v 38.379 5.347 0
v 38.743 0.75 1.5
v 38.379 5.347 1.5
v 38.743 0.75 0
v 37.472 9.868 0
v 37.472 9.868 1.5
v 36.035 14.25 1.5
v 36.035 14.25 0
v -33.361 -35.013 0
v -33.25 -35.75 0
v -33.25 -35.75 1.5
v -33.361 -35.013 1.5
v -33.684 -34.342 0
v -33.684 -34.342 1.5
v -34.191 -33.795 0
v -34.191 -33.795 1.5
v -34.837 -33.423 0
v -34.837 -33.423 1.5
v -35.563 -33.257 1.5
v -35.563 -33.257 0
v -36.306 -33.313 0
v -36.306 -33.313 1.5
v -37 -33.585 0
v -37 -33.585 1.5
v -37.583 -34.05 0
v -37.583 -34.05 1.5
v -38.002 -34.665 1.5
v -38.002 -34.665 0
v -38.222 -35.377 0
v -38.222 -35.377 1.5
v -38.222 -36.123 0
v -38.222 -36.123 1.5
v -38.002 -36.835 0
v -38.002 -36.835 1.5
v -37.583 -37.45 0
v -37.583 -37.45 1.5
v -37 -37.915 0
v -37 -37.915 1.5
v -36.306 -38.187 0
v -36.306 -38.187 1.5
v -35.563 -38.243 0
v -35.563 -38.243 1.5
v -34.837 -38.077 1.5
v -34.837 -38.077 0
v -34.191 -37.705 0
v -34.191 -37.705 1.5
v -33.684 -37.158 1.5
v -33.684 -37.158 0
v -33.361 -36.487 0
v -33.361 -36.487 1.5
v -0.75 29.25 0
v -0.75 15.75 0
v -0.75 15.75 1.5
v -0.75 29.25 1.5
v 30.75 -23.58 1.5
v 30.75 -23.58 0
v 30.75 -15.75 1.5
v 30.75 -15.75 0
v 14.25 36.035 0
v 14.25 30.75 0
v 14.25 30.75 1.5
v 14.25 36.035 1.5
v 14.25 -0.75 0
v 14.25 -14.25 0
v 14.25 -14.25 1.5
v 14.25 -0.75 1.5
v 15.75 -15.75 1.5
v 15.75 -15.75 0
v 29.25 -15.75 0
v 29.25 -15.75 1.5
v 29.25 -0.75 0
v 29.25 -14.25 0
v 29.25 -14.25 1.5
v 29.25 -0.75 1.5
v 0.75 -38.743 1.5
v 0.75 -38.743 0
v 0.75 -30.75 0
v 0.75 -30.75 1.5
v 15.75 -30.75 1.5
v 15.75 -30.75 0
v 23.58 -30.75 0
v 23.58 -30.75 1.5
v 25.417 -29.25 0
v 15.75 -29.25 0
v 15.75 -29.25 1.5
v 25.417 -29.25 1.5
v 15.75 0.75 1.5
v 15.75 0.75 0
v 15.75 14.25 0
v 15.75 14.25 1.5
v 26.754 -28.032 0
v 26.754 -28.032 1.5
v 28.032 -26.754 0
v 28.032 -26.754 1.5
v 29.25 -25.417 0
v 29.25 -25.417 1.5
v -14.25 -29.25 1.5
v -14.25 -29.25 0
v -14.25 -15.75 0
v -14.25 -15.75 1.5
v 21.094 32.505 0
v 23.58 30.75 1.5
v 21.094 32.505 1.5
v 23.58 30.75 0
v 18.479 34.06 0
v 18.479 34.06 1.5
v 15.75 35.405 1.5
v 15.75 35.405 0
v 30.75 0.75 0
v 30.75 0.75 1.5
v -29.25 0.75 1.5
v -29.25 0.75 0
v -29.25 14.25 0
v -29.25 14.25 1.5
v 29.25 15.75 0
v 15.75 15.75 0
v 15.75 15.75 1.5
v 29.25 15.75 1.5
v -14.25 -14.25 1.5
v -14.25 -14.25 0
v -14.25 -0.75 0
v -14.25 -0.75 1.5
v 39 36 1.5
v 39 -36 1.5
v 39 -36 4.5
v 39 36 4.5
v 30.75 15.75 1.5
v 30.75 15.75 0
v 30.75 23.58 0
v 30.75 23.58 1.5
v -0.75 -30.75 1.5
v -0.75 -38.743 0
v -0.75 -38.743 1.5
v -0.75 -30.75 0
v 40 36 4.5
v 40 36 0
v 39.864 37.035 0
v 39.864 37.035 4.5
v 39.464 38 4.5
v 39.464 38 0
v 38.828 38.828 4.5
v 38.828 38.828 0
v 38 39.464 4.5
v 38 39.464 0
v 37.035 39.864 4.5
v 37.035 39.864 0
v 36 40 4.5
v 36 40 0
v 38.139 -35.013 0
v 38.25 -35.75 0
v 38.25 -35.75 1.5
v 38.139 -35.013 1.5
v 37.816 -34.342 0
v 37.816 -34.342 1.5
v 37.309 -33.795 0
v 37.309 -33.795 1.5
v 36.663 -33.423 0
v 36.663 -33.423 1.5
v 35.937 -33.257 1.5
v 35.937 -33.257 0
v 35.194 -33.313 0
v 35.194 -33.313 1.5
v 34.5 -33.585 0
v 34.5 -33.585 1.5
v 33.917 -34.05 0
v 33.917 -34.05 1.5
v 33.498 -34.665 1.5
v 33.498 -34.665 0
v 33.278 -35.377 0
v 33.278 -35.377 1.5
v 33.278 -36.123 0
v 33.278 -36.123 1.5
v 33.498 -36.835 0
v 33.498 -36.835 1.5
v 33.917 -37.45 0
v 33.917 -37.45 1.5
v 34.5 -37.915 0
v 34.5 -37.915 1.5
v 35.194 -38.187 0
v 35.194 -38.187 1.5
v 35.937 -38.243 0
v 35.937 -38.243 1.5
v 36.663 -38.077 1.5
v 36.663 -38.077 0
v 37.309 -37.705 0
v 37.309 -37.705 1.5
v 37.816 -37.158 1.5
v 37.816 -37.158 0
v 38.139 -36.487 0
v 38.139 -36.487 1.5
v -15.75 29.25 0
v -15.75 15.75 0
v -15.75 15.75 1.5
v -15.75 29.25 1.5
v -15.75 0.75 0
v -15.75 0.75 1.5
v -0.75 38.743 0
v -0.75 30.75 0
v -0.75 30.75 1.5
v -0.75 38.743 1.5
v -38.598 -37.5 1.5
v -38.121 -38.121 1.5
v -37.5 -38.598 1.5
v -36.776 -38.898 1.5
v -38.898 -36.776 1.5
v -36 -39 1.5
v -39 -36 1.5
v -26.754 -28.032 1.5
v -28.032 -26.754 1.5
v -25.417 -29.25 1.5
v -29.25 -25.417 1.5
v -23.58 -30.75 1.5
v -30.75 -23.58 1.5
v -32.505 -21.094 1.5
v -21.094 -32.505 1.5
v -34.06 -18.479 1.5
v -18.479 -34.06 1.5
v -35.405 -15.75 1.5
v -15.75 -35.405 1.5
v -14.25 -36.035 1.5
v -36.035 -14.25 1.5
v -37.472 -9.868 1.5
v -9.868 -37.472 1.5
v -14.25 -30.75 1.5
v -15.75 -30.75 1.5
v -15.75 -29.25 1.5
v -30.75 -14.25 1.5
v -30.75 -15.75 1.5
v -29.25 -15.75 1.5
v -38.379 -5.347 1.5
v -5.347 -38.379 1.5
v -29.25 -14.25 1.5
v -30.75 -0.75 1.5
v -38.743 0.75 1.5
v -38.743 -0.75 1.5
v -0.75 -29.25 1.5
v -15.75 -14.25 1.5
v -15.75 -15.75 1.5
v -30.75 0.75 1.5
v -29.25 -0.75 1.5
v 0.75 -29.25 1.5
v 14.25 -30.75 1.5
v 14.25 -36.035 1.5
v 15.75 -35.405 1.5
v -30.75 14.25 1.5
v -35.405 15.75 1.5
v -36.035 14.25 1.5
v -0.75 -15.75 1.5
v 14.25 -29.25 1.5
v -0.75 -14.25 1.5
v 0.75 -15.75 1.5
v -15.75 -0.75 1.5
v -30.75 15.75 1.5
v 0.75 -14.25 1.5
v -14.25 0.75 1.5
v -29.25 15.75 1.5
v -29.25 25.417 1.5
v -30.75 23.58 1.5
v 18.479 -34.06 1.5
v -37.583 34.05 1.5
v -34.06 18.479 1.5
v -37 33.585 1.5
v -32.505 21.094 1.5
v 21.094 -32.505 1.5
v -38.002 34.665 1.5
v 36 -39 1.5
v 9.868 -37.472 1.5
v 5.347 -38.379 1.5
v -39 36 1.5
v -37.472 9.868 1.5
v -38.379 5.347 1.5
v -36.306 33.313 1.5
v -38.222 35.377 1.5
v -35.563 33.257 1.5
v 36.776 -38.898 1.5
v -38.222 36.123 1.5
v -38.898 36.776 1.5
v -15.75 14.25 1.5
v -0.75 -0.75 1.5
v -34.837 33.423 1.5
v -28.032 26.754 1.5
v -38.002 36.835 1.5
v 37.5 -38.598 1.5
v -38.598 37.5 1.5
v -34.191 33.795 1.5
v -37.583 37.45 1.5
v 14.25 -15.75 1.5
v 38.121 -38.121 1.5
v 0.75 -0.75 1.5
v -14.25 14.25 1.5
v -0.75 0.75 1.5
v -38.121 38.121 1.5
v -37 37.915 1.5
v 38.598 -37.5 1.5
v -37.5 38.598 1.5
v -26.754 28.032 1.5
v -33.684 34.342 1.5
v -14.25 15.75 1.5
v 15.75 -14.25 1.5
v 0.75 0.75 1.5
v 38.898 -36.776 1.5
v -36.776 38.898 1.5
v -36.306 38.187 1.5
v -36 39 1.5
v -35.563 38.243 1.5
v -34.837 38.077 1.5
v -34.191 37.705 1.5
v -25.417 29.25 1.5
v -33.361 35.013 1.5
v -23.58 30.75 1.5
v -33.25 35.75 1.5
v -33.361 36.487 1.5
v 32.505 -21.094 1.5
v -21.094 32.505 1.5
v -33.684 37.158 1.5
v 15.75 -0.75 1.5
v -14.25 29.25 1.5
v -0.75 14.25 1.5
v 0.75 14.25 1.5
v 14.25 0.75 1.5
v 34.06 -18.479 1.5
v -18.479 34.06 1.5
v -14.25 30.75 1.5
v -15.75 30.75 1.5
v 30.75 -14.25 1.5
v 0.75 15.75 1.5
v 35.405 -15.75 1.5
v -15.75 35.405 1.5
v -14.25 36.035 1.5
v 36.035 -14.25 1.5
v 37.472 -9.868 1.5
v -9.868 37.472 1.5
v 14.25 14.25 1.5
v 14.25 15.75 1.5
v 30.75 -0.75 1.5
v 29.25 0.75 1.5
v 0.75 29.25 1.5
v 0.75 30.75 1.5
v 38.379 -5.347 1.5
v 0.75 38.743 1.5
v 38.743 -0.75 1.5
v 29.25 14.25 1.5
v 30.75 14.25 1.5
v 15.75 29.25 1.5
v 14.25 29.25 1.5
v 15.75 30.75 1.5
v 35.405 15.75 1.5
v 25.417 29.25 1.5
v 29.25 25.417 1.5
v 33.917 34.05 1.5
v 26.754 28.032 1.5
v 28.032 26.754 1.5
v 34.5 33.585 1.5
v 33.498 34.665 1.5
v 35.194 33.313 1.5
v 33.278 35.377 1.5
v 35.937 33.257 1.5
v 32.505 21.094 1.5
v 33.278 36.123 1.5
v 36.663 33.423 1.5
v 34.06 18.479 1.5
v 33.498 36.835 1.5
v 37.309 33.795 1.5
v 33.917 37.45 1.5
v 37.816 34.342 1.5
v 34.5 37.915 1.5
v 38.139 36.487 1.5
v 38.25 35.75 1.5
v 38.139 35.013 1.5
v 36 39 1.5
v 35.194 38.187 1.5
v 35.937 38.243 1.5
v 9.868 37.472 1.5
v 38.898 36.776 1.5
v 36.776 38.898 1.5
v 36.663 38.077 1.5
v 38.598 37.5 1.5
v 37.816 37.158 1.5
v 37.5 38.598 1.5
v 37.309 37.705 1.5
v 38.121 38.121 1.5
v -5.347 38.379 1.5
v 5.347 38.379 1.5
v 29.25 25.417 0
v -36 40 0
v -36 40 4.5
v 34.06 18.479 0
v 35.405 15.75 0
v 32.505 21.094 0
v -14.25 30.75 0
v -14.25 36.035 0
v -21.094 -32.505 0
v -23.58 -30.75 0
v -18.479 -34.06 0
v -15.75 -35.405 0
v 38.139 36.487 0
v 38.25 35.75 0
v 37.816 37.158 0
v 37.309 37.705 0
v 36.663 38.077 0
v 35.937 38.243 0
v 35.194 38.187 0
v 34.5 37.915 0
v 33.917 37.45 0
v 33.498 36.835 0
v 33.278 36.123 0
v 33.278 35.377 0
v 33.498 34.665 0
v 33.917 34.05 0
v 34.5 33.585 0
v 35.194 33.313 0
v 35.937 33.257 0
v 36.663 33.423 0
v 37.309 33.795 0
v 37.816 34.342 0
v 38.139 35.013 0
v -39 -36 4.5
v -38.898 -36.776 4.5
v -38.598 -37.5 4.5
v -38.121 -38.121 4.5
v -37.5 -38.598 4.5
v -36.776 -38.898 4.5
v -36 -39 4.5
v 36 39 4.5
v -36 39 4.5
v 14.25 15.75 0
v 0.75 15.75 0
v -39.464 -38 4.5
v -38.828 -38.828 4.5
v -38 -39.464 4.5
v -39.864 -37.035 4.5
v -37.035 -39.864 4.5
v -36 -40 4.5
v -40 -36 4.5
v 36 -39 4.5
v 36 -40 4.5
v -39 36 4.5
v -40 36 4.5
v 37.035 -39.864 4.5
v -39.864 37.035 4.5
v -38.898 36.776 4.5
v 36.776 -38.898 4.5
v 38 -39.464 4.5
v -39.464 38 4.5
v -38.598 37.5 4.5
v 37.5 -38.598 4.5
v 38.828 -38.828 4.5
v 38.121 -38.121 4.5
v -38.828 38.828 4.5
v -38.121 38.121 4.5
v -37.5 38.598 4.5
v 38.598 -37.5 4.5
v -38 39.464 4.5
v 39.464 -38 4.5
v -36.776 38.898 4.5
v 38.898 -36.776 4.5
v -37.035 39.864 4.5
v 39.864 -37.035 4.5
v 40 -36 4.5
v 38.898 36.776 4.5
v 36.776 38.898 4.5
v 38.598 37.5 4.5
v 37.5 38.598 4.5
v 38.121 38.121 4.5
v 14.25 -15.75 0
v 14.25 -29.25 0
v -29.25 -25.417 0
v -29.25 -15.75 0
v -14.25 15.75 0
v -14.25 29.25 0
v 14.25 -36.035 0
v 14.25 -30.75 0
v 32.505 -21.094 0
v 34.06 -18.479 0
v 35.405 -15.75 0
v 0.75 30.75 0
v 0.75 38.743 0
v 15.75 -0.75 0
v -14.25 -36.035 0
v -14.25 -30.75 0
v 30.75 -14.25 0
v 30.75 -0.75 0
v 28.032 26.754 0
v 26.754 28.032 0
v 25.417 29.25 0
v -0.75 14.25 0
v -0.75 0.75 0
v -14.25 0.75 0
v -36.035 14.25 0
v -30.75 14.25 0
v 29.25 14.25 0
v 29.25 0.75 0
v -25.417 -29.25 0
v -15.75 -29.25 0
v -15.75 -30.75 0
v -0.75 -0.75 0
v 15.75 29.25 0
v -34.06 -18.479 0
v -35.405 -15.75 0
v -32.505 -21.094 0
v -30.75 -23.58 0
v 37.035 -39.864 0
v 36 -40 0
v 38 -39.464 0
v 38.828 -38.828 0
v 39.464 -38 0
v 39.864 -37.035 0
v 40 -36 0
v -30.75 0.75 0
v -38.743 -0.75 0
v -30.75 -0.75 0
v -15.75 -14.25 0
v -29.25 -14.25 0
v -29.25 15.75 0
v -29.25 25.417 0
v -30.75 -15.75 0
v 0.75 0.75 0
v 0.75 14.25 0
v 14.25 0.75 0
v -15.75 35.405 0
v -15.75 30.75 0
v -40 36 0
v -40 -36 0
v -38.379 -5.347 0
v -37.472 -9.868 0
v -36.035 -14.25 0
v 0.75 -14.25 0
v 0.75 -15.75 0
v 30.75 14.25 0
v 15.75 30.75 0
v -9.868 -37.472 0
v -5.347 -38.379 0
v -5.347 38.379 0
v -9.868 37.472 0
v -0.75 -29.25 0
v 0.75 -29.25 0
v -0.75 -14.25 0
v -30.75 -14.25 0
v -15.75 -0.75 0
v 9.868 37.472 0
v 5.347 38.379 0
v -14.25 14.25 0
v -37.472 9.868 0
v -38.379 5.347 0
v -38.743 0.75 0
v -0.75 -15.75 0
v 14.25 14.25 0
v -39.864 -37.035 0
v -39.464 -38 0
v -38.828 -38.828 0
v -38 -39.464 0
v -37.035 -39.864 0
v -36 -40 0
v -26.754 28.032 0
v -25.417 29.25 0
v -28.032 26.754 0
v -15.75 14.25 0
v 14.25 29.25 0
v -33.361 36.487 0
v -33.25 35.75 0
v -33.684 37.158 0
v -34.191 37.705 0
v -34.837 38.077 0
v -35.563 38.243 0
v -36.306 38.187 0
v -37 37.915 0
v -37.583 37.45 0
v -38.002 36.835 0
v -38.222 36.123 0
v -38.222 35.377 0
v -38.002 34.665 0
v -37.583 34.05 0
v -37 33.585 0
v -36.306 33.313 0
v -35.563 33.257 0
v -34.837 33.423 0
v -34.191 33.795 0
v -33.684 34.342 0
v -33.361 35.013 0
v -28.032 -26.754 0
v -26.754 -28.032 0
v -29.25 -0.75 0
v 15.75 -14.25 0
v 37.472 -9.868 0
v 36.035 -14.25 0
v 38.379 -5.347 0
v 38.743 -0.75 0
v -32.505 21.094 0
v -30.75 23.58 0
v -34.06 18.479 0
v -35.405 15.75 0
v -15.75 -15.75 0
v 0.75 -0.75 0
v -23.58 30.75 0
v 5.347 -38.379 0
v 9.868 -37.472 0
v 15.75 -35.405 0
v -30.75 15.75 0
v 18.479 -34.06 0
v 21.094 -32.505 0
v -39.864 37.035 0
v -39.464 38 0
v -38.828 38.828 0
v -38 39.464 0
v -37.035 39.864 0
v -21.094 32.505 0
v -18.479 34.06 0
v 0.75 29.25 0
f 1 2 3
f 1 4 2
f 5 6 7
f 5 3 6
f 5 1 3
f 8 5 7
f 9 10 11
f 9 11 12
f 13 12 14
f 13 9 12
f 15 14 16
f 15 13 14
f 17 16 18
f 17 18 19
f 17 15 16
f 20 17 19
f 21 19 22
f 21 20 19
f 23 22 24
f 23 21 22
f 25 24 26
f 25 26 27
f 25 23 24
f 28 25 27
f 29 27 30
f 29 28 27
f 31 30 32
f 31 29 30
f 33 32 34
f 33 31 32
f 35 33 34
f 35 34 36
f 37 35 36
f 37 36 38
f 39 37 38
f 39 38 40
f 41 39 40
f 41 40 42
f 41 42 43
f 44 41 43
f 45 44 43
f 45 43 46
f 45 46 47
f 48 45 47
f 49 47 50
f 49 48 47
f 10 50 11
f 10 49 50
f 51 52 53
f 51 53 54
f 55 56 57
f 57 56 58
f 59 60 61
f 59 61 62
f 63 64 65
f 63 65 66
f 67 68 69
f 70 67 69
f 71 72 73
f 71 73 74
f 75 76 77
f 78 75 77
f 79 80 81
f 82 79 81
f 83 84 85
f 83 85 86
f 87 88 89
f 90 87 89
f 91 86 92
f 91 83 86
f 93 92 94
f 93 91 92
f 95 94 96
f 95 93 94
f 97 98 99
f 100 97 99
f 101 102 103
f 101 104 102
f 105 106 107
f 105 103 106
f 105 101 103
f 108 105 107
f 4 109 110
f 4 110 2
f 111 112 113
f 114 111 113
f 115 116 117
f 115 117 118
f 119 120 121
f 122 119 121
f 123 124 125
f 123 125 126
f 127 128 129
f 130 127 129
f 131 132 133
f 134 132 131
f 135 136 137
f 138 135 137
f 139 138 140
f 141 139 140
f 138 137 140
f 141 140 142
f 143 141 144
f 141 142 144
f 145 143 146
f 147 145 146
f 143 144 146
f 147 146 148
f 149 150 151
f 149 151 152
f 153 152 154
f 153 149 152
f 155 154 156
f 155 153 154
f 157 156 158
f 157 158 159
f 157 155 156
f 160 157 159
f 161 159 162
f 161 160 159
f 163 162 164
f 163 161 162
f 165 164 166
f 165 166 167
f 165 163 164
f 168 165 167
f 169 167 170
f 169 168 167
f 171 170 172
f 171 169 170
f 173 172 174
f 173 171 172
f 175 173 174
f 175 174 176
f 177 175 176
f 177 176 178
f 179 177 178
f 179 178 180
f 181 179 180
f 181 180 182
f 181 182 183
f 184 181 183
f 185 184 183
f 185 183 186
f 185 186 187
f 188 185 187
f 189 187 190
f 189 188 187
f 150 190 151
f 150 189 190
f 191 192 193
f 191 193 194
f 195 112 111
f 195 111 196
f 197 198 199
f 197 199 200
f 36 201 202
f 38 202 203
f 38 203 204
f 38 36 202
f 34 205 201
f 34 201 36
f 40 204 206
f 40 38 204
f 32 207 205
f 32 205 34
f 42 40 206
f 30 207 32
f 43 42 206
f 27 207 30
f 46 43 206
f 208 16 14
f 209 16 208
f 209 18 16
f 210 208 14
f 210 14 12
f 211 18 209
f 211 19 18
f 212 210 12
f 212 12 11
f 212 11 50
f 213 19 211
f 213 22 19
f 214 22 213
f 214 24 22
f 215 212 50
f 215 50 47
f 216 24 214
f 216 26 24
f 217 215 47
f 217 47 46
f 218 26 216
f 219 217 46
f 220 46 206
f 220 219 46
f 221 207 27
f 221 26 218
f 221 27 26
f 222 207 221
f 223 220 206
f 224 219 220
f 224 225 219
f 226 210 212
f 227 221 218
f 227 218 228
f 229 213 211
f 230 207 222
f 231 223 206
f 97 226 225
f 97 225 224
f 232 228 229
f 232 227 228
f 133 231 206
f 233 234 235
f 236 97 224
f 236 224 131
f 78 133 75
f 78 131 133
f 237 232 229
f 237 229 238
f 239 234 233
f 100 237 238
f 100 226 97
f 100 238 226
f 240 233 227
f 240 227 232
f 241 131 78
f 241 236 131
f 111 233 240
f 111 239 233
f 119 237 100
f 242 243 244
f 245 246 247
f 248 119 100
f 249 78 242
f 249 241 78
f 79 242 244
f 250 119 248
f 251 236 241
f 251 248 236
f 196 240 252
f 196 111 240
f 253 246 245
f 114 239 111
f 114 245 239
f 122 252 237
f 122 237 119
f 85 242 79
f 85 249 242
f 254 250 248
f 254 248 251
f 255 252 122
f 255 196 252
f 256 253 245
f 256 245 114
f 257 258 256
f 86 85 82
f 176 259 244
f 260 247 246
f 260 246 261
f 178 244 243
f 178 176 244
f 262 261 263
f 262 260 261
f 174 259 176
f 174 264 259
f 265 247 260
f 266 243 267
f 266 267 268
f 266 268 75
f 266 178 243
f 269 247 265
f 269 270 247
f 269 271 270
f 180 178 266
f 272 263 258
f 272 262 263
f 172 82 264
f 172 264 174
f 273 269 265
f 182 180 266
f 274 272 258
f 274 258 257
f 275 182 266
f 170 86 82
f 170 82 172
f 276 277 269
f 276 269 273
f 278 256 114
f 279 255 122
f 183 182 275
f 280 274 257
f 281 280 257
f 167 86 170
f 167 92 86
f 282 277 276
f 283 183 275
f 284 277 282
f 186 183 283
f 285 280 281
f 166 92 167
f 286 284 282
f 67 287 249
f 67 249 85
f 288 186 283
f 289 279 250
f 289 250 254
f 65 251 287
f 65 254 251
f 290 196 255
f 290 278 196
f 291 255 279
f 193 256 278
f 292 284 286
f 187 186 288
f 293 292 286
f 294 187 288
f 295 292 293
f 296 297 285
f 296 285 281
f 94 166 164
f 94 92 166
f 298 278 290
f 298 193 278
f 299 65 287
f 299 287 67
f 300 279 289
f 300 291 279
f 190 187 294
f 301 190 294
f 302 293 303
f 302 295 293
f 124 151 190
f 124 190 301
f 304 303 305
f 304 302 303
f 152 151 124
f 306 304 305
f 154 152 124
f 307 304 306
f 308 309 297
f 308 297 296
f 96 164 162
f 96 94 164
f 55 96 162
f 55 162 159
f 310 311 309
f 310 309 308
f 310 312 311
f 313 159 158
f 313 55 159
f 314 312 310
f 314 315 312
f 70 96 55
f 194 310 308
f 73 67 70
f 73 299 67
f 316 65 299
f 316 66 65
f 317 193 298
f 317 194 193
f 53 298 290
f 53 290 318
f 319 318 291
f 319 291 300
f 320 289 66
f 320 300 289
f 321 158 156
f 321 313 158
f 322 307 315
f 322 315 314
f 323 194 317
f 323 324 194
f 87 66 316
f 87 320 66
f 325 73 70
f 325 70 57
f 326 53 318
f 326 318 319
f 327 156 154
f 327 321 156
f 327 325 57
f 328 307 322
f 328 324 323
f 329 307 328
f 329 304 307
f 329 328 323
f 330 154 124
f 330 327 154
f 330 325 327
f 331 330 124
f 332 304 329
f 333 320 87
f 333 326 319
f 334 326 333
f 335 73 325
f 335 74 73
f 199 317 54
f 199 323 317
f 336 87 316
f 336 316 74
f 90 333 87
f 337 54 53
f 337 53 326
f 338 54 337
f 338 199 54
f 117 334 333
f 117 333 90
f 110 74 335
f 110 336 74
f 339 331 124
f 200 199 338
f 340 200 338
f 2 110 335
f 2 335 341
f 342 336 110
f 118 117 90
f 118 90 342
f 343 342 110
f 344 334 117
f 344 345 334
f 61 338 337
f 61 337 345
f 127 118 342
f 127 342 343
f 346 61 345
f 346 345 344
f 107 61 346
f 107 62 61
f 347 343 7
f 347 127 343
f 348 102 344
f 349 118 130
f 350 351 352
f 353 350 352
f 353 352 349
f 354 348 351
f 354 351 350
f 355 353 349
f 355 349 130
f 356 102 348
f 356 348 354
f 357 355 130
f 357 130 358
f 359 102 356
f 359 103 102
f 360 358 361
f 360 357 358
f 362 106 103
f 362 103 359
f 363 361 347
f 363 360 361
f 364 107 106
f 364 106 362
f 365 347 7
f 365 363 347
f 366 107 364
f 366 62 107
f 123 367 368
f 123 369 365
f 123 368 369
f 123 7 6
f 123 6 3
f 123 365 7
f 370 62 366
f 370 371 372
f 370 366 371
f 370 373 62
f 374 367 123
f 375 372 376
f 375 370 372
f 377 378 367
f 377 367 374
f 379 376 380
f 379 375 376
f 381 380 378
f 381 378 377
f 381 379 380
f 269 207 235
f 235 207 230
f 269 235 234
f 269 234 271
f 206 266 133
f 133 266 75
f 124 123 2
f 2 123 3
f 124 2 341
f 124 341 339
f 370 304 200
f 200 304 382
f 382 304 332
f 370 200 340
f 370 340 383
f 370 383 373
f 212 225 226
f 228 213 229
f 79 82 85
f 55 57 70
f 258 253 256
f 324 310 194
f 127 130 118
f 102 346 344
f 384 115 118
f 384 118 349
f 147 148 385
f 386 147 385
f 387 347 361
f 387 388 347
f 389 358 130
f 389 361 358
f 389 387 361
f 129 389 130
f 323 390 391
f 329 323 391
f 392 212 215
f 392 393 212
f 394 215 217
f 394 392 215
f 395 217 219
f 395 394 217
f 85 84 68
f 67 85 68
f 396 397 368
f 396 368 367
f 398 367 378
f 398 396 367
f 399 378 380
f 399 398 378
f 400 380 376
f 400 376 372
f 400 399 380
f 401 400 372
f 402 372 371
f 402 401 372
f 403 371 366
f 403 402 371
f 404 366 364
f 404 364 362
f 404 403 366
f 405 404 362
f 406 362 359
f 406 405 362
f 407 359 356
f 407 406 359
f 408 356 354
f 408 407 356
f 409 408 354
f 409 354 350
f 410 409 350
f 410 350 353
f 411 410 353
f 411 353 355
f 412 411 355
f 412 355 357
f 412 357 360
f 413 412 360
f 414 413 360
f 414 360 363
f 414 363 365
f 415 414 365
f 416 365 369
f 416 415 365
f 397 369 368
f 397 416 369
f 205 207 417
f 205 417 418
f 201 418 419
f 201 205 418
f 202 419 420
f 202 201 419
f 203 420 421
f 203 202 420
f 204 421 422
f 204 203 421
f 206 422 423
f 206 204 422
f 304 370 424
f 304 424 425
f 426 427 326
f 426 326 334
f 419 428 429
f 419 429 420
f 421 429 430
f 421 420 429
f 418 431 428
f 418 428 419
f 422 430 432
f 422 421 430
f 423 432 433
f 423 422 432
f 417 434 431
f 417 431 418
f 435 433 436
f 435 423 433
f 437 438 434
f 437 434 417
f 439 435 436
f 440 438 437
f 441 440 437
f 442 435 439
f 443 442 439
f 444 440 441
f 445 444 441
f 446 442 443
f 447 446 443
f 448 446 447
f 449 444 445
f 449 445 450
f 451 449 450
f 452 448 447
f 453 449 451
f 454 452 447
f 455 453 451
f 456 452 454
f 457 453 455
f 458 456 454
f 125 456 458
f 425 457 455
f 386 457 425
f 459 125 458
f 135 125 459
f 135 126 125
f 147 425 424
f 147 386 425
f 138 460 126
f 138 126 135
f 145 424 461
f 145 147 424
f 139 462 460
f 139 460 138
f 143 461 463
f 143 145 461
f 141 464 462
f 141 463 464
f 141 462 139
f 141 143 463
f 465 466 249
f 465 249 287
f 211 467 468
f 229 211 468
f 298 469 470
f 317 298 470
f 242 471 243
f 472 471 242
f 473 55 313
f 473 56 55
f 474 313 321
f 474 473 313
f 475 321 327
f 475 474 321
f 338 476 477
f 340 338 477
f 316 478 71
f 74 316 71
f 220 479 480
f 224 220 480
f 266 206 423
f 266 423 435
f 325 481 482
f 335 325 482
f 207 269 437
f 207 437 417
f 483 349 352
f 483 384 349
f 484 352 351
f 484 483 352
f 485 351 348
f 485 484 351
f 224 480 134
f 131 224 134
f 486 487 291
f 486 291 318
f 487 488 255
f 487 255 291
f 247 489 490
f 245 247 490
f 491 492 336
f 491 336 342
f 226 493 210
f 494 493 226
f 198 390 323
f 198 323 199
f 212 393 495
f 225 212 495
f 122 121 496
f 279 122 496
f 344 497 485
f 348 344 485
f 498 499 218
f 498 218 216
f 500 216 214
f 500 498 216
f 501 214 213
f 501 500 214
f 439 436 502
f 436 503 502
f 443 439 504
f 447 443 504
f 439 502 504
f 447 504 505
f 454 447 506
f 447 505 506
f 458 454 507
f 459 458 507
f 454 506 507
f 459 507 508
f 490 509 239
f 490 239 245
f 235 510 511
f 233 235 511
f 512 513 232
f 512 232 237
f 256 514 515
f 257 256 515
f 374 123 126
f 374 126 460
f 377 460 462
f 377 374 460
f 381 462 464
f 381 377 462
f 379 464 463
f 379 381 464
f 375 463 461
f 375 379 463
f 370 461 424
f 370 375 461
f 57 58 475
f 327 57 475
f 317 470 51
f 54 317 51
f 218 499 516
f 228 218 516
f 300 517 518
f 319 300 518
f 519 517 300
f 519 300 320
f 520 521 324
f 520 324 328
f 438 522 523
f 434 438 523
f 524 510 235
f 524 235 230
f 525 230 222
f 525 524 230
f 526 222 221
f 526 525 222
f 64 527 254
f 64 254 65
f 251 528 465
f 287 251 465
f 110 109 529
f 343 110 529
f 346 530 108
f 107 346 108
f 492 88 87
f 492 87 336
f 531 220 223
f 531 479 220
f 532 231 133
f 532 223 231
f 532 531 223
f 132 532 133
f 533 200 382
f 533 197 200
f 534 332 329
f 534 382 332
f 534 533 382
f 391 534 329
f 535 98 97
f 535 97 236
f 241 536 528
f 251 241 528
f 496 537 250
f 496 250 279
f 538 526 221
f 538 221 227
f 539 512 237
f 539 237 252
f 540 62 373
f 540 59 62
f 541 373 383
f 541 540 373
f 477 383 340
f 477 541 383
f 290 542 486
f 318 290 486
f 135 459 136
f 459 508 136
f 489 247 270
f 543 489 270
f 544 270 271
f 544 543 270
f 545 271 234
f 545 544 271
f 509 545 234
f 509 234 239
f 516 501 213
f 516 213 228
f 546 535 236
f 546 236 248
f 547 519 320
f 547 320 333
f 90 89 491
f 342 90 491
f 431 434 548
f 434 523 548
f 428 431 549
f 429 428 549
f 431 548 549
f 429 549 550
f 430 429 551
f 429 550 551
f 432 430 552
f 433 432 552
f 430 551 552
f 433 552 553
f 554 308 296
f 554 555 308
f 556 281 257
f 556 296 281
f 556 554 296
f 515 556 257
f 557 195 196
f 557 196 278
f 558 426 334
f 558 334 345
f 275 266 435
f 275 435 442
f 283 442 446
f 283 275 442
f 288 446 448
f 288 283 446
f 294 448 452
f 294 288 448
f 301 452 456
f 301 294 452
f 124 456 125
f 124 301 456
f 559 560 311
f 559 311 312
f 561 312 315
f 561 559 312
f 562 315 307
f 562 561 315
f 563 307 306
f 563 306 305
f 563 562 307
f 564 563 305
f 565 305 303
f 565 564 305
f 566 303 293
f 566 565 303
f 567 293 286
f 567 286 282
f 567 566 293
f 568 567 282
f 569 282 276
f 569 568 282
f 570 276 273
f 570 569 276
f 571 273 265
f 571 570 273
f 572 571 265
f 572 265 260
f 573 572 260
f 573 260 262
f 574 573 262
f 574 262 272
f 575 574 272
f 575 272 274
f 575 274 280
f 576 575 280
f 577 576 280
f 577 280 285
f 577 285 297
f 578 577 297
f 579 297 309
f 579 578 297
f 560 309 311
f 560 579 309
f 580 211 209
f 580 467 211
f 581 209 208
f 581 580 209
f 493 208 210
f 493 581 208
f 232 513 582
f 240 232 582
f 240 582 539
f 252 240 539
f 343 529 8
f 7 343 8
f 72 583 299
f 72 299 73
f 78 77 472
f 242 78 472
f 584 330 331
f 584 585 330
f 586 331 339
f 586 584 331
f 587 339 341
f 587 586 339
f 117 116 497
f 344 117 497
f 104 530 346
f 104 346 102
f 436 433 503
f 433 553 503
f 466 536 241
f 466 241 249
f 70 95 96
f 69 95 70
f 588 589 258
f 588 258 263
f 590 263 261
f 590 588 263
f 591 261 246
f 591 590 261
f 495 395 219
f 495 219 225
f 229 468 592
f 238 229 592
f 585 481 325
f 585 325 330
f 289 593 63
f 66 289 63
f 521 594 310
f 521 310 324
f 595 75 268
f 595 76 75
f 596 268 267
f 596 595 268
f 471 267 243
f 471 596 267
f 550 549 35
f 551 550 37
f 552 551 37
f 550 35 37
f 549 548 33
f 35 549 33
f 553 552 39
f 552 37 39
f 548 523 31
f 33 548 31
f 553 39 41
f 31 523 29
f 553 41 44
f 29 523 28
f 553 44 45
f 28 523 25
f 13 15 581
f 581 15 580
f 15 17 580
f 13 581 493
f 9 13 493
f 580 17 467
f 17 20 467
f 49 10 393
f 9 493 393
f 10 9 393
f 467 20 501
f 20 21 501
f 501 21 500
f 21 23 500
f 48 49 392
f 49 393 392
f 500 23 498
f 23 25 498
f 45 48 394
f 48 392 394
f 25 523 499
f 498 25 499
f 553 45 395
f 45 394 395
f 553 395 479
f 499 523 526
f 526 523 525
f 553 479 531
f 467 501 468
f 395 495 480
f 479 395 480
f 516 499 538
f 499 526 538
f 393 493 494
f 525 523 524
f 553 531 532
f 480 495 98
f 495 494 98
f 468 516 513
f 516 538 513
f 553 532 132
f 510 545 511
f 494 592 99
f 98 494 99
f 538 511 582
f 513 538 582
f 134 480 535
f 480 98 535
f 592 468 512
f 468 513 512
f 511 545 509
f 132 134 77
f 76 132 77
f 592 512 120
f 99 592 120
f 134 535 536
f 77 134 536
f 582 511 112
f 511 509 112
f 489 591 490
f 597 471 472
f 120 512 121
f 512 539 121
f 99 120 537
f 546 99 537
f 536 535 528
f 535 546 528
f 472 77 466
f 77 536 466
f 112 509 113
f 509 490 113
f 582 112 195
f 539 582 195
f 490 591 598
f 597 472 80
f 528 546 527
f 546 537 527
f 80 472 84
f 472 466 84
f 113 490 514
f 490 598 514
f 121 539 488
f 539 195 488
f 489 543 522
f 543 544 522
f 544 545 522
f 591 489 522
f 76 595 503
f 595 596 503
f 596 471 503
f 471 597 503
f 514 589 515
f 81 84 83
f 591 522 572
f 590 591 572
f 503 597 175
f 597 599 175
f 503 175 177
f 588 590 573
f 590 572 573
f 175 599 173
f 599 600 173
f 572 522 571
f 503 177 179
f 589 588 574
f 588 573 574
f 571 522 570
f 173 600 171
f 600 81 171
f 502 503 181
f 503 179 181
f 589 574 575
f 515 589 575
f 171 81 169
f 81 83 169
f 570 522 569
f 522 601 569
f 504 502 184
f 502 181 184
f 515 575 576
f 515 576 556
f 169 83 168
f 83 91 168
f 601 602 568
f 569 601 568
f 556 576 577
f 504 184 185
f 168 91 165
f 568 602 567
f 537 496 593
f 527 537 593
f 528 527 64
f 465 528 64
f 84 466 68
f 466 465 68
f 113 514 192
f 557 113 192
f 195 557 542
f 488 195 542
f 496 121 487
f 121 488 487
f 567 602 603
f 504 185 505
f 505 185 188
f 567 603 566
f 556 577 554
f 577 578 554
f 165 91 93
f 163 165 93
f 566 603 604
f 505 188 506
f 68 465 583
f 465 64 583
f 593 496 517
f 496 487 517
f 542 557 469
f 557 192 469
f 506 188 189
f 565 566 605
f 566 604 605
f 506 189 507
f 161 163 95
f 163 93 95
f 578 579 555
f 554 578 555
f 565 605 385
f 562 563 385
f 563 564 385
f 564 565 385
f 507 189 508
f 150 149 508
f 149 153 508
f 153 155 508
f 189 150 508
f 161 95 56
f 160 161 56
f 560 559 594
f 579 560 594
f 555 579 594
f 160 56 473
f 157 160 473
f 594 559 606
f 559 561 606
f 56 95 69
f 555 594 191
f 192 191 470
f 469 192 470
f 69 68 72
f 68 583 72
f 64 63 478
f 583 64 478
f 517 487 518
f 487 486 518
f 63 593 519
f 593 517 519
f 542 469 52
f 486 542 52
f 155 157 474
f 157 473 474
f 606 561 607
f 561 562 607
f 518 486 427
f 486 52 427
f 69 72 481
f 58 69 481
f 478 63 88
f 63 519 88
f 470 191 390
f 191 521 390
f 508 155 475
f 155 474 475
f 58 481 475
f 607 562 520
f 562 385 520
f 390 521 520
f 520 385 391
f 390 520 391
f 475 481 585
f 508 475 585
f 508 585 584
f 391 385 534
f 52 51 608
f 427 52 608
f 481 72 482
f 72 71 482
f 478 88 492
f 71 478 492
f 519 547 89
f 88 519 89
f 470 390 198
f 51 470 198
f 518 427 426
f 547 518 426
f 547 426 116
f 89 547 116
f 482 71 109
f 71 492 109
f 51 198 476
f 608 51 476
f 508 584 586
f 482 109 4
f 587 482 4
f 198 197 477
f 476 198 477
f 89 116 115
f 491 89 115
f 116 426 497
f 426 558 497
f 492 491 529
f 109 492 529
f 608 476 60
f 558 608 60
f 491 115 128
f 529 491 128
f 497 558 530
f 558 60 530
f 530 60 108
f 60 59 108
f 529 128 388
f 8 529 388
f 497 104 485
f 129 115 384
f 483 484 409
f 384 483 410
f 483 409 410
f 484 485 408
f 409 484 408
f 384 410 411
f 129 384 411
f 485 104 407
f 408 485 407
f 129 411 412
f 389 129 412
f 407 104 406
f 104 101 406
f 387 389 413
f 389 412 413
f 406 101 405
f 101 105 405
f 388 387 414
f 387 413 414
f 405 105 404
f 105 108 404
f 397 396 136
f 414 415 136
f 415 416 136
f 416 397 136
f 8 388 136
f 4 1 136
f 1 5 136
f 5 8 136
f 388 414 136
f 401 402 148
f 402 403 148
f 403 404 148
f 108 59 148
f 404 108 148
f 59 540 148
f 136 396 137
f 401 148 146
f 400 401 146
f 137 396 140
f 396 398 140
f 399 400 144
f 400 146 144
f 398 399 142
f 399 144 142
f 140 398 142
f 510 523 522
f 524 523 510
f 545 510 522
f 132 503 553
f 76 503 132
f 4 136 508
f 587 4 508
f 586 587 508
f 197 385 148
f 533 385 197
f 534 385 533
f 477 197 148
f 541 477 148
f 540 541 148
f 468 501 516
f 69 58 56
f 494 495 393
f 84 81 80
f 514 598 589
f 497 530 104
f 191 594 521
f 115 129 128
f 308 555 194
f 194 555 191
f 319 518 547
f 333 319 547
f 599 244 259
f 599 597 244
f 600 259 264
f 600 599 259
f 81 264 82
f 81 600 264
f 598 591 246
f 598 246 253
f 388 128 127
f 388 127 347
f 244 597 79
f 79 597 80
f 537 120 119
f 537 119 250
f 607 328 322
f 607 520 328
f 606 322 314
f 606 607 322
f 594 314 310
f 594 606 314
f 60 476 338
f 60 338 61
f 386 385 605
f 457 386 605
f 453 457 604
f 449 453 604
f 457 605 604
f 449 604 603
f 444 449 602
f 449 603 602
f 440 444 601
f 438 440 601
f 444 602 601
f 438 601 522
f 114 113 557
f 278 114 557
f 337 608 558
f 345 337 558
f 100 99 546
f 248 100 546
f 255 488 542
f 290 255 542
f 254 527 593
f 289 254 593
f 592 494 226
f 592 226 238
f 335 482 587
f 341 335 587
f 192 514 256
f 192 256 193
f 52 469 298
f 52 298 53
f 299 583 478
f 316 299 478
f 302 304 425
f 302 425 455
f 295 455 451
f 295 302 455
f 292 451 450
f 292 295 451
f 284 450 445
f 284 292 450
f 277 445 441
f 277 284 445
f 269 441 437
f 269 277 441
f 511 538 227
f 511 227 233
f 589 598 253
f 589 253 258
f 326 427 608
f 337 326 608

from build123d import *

# Parameters (mm, degrees)
SKETCH006_R            = 2.5
SKETCH006_R_2          = 38.75
PAD004_DEPTH           = 1.5
SKETCH007_W            = 1.5
SKETCH007_H            = 80
PAD005_DEPTH           = 1.5
LINEARPATTERN002_COUNT = 5
LINEARPATTERN002_PITCH = 15
SKETCH008_W            = 80
SKETCH008_H            = 1.5
PAD006_DEPTH           = 1.5
LINEARPATTERN003_COUNT = 5
LINEARPATTERN003_PITCH = 15
PAD007_DEPTH           = 3


with BuildPart() as part:
    # Sketch006 → Pad004 (new body)
    with BuildSketch(Plane.XY):
        with BuildLine():
            Line((40, -36), (40, 36))
            ThreePointArc((40, 36), (38.828427, 38.828427), (36, 40))
            Line((36, 40), (-36, 40))
            ThreePointArc((-36, 40), (-38.828427, 38.828427), (-40, 36))
            Line((-40, 36), (-40, -36))
            ThreePointArc((-40, -36), (-38.828427, -38.828427), (-36, -40))
            Line((-36, -40), (36, -40))
            ThreePointArc((36, -40), (38.828427, -38.828427), (40, -36))
        make_face()
        with Locations((-35.75, 35.75)):
            Circle(SKETCH006_R, mode=Mode.SUBTRACT)
        with Locations((35.75, 35.75)):
            Circle(SKETCH006_R, mode=Mode.SUBTRACT)
        with Locations((35.75, -35.75)):
            Circle(SKETCH006_R, mode=Mode.SUBTRACT)
        with Locations((-35.75, -35.75)):
            Circle(SKETCH006_R, mode=Mode.SUBTRACT)
        Circle(SKETCH006_R_2, mode=Mode.SUBTRACT)
    extrude(amount=PAD004_DEPTH)

    # Sketch007 → Pad005 (join)
    with BuildSketch(Plane.XY):
        with Locations((-30, 0)):
            Rectangle(SKETCH007_W, SKETCH007_H)
    pad005 = extrude(amount=PAD005_DEPTH)

    # LinearPattern002: Pad005 ×5
    with Locations(*[(i * LINEARPATTERN002_PITCH, 0, 0) for i in range(1, LINEARPATTERN002_COUNT)]):
        add(pad005)

    # Sketch008 → Pad006 (join)
    with BuildSketch(Plane.XY):
        with Locations((0, -30)):
            Rectangle(SKETCH008_W, SKETCH008_H)
    pad006 = extrude(amount=PAD006_DEPTH)

    # LinearPattern003: Pad006 ×5
    with Locations(*[(0, i * LINEARPATTERN003_PITCH, 0) for i in range(1, LINEARPATTERN003_COUNT)]):
        add(pad006)

    # Sketch009 (on Face137 of LinearPattern003) → Pad007 (join)
    with BuildSketch(Plane.XY.offset(1.5)):
        with BuildLine():
            Line((-40, 36), (-40, -36))
            ThreePointArc((-40, -36), (-38.828427, -38.828427), (-36, -40))
            Line((-36, -40), (36, -40))
            ThreePointArc((36, -40), (38.828427, -38.828427), (40, -36))
            Line((40, -36), (40, 36))
            ThreePointArc((40, 36), (38.828427, 38.828427), (36, 40))
            Line((36, 40), (-36, 40))
            ThreePointArc((-36, 40), (-38.828427, 38.828427), (-40, 36))
        make_face()
        with BuildLine():
            Line((-39, 36), (-39, -36))
            ThreePointArc((-39, -36), (-38.12132, -38.12132), (-36, -39))
            Line((-36, -39), (36, -39))
            ThreePointArc((36, -39), (38.12132, -38.12132), (39, -36))
            Line((39, -36), (39, 36))
            ThreePointArc((39, 36), (38.12132, 38.12132), (36, 39))
            Line((36, 39), (-36, 39))
            ThreePointArc((-36, 39), (-38.12132, 38.12132), (-39, 36))
        make_face(mode=Mode.SUBTRACT)
    extrude(amount=PAD007_DEPTH)


solid = part.part
